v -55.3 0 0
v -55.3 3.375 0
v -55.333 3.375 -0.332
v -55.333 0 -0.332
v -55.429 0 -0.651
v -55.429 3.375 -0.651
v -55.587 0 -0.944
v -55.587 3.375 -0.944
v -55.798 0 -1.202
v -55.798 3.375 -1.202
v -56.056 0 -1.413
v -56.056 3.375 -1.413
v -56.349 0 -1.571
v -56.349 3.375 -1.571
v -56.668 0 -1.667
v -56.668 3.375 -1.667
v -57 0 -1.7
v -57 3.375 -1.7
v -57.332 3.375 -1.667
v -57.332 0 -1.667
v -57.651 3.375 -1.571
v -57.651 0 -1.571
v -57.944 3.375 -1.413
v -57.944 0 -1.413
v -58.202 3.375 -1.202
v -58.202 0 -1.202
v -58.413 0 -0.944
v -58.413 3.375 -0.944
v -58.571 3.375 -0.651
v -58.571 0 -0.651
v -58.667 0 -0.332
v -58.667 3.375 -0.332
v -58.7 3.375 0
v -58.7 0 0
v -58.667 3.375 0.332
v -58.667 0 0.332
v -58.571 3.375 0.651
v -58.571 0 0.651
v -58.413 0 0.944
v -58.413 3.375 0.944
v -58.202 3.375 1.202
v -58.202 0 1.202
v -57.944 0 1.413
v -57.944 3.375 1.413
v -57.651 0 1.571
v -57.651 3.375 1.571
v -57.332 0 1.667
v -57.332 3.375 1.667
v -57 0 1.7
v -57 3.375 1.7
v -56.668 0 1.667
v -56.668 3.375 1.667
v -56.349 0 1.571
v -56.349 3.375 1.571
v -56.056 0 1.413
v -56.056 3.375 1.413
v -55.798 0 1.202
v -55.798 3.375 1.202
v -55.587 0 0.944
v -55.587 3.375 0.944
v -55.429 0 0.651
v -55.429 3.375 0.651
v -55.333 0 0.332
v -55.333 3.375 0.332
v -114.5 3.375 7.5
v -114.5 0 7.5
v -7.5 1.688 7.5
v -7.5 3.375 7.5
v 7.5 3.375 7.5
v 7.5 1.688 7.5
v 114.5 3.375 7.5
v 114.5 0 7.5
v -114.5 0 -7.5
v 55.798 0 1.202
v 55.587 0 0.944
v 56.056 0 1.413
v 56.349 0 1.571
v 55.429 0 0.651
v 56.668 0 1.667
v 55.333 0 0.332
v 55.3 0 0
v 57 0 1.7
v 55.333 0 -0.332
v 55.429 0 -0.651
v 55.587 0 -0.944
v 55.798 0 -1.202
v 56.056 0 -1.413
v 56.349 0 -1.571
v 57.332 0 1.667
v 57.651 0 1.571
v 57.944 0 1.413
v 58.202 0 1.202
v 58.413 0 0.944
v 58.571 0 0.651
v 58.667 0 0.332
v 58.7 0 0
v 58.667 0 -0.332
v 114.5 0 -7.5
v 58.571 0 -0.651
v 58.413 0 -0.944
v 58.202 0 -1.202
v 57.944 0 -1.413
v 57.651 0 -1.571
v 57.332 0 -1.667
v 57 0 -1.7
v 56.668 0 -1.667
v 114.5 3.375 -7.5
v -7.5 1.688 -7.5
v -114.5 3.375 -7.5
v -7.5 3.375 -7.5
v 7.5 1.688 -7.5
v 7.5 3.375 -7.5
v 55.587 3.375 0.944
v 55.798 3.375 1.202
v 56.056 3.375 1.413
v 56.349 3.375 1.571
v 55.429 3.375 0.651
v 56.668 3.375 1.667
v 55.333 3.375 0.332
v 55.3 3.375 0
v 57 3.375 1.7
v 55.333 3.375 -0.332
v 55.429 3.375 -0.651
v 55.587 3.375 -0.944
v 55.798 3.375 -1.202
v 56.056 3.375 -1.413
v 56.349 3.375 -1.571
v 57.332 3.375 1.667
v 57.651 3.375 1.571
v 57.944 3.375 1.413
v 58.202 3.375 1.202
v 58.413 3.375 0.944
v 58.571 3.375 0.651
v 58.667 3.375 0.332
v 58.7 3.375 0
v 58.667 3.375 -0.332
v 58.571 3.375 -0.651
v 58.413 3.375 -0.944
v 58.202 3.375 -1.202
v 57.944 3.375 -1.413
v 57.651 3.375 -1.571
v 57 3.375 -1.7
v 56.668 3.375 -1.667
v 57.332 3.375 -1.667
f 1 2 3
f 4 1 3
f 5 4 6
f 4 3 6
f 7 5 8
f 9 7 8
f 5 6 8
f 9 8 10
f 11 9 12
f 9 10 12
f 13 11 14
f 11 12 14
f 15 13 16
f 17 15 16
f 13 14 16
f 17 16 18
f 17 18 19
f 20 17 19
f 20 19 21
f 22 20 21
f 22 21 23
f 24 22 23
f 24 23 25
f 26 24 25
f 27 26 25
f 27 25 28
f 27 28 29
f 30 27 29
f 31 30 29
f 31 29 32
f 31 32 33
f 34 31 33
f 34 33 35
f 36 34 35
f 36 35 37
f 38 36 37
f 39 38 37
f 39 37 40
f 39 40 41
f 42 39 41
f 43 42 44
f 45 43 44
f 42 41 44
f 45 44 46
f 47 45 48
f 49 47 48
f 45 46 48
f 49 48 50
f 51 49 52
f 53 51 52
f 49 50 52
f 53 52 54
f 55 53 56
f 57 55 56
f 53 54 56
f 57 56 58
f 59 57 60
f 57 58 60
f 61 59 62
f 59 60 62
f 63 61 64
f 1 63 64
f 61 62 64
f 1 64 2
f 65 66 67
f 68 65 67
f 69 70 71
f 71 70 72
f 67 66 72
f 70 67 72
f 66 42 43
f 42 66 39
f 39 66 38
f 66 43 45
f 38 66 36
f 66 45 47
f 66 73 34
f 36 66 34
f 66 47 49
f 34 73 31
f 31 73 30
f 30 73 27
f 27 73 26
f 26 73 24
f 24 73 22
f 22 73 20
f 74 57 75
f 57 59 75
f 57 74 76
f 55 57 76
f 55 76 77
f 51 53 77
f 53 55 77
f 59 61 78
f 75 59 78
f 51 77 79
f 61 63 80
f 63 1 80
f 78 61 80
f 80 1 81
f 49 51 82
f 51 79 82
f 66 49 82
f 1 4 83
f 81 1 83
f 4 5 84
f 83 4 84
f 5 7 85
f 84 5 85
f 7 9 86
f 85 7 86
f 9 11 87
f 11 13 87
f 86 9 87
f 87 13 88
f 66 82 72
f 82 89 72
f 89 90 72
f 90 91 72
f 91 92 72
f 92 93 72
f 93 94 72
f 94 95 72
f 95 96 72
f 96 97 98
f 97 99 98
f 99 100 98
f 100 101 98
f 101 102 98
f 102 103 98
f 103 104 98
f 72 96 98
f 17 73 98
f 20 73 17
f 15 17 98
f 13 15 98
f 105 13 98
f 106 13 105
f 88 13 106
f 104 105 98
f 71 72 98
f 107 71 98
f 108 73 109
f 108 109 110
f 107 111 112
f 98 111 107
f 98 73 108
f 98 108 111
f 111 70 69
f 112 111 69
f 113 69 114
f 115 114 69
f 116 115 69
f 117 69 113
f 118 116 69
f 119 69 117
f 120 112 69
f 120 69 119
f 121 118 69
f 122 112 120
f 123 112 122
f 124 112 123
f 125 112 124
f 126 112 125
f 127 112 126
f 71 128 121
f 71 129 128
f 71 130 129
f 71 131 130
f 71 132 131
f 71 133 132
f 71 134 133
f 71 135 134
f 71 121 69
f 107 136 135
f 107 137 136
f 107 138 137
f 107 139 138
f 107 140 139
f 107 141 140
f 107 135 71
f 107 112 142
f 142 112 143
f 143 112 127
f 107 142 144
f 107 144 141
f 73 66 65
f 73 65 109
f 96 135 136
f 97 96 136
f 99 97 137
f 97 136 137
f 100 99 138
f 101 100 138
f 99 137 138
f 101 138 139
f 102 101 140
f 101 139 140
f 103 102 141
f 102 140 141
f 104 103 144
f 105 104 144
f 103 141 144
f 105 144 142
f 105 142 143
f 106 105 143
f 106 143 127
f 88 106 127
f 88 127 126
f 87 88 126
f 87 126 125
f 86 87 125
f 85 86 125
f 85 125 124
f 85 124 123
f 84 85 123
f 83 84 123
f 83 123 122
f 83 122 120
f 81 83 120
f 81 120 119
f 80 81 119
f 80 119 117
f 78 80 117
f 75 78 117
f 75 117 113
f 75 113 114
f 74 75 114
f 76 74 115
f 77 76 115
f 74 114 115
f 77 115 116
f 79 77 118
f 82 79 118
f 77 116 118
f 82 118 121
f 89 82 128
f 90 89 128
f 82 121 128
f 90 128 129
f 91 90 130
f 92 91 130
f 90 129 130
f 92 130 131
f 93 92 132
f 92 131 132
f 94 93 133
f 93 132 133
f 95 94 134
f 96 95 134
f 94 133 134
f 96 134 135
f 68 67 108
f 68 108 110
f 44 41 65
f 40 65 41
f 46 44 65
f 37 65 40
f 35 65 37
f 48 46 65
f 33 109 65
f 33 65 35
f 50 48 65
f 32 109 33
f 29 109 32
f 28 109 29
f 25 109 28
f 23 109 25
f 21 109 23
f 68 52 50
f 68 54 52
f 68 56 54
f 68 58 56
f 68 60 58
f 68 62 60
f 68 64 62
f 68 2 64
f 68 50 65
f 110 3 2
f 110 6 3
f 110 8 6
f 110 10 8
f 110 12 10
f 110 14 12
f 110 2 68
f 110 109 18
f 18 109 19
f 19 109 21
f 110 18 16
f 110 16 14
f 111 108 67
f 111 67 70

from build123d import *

# Parameters (mm, degrees)
SKETCH1_W               = 229
SKETCH1_H               = 15
BOSS_EXTRUDE1_DEPTH     = 3.375
M3_CLEARANCE_HOLE1_D    = 3.4
CUT_EXTRUDE1_DEPTH      = 116.527661731
CUT_EXTRUDE1_DEPTH_BACK = 116.527661731
SKETCH10_W              = 15
SKETCH10_H              = 1.6875


with BuildPart() as part:
    # Sketch1 → Boss-Extrude1 (new body)
    with BuildSketch(Plane(origin=(0, 0, 0), x_dir=(1, 0, 0), z_dir=(0, 1, 0))):
        Rectangle(SKETCH1_W, SKETCH1_H)
    extrude(amount=BOSS_EXTRUDE1_DEPTH)

    # M3 Clearance Hole1 (through all)
    with Locations(Plane(origin=(0, 0, 0), x_dir=(-1, 0, 0), z_dir=(0, -1, 0))):
        with Locations((57, 0), (-57, 0)):
            Hole(M3_CLEARANCE_HOLE1_D / 2)

    # Sketch10 → Cut-Extrude1 (cut, two sides: drawn at the far end of the back side and taken through both)
    with BuildSketch(Plane.XY.offset(7.5).offset(-CUT_EXTRUDE1_DEPTH_BACK)):
        with Locations((0, 2.53125)):
            Rectangle(SKETCH10_W, SKETCH10_H)
    extrude(amount=CUT_EXTRUDE1_DEPTH + CUT_EXTRUDE1_DEPTH_BACK, mode=Mode.SUBTRACT)


solid = part.part
